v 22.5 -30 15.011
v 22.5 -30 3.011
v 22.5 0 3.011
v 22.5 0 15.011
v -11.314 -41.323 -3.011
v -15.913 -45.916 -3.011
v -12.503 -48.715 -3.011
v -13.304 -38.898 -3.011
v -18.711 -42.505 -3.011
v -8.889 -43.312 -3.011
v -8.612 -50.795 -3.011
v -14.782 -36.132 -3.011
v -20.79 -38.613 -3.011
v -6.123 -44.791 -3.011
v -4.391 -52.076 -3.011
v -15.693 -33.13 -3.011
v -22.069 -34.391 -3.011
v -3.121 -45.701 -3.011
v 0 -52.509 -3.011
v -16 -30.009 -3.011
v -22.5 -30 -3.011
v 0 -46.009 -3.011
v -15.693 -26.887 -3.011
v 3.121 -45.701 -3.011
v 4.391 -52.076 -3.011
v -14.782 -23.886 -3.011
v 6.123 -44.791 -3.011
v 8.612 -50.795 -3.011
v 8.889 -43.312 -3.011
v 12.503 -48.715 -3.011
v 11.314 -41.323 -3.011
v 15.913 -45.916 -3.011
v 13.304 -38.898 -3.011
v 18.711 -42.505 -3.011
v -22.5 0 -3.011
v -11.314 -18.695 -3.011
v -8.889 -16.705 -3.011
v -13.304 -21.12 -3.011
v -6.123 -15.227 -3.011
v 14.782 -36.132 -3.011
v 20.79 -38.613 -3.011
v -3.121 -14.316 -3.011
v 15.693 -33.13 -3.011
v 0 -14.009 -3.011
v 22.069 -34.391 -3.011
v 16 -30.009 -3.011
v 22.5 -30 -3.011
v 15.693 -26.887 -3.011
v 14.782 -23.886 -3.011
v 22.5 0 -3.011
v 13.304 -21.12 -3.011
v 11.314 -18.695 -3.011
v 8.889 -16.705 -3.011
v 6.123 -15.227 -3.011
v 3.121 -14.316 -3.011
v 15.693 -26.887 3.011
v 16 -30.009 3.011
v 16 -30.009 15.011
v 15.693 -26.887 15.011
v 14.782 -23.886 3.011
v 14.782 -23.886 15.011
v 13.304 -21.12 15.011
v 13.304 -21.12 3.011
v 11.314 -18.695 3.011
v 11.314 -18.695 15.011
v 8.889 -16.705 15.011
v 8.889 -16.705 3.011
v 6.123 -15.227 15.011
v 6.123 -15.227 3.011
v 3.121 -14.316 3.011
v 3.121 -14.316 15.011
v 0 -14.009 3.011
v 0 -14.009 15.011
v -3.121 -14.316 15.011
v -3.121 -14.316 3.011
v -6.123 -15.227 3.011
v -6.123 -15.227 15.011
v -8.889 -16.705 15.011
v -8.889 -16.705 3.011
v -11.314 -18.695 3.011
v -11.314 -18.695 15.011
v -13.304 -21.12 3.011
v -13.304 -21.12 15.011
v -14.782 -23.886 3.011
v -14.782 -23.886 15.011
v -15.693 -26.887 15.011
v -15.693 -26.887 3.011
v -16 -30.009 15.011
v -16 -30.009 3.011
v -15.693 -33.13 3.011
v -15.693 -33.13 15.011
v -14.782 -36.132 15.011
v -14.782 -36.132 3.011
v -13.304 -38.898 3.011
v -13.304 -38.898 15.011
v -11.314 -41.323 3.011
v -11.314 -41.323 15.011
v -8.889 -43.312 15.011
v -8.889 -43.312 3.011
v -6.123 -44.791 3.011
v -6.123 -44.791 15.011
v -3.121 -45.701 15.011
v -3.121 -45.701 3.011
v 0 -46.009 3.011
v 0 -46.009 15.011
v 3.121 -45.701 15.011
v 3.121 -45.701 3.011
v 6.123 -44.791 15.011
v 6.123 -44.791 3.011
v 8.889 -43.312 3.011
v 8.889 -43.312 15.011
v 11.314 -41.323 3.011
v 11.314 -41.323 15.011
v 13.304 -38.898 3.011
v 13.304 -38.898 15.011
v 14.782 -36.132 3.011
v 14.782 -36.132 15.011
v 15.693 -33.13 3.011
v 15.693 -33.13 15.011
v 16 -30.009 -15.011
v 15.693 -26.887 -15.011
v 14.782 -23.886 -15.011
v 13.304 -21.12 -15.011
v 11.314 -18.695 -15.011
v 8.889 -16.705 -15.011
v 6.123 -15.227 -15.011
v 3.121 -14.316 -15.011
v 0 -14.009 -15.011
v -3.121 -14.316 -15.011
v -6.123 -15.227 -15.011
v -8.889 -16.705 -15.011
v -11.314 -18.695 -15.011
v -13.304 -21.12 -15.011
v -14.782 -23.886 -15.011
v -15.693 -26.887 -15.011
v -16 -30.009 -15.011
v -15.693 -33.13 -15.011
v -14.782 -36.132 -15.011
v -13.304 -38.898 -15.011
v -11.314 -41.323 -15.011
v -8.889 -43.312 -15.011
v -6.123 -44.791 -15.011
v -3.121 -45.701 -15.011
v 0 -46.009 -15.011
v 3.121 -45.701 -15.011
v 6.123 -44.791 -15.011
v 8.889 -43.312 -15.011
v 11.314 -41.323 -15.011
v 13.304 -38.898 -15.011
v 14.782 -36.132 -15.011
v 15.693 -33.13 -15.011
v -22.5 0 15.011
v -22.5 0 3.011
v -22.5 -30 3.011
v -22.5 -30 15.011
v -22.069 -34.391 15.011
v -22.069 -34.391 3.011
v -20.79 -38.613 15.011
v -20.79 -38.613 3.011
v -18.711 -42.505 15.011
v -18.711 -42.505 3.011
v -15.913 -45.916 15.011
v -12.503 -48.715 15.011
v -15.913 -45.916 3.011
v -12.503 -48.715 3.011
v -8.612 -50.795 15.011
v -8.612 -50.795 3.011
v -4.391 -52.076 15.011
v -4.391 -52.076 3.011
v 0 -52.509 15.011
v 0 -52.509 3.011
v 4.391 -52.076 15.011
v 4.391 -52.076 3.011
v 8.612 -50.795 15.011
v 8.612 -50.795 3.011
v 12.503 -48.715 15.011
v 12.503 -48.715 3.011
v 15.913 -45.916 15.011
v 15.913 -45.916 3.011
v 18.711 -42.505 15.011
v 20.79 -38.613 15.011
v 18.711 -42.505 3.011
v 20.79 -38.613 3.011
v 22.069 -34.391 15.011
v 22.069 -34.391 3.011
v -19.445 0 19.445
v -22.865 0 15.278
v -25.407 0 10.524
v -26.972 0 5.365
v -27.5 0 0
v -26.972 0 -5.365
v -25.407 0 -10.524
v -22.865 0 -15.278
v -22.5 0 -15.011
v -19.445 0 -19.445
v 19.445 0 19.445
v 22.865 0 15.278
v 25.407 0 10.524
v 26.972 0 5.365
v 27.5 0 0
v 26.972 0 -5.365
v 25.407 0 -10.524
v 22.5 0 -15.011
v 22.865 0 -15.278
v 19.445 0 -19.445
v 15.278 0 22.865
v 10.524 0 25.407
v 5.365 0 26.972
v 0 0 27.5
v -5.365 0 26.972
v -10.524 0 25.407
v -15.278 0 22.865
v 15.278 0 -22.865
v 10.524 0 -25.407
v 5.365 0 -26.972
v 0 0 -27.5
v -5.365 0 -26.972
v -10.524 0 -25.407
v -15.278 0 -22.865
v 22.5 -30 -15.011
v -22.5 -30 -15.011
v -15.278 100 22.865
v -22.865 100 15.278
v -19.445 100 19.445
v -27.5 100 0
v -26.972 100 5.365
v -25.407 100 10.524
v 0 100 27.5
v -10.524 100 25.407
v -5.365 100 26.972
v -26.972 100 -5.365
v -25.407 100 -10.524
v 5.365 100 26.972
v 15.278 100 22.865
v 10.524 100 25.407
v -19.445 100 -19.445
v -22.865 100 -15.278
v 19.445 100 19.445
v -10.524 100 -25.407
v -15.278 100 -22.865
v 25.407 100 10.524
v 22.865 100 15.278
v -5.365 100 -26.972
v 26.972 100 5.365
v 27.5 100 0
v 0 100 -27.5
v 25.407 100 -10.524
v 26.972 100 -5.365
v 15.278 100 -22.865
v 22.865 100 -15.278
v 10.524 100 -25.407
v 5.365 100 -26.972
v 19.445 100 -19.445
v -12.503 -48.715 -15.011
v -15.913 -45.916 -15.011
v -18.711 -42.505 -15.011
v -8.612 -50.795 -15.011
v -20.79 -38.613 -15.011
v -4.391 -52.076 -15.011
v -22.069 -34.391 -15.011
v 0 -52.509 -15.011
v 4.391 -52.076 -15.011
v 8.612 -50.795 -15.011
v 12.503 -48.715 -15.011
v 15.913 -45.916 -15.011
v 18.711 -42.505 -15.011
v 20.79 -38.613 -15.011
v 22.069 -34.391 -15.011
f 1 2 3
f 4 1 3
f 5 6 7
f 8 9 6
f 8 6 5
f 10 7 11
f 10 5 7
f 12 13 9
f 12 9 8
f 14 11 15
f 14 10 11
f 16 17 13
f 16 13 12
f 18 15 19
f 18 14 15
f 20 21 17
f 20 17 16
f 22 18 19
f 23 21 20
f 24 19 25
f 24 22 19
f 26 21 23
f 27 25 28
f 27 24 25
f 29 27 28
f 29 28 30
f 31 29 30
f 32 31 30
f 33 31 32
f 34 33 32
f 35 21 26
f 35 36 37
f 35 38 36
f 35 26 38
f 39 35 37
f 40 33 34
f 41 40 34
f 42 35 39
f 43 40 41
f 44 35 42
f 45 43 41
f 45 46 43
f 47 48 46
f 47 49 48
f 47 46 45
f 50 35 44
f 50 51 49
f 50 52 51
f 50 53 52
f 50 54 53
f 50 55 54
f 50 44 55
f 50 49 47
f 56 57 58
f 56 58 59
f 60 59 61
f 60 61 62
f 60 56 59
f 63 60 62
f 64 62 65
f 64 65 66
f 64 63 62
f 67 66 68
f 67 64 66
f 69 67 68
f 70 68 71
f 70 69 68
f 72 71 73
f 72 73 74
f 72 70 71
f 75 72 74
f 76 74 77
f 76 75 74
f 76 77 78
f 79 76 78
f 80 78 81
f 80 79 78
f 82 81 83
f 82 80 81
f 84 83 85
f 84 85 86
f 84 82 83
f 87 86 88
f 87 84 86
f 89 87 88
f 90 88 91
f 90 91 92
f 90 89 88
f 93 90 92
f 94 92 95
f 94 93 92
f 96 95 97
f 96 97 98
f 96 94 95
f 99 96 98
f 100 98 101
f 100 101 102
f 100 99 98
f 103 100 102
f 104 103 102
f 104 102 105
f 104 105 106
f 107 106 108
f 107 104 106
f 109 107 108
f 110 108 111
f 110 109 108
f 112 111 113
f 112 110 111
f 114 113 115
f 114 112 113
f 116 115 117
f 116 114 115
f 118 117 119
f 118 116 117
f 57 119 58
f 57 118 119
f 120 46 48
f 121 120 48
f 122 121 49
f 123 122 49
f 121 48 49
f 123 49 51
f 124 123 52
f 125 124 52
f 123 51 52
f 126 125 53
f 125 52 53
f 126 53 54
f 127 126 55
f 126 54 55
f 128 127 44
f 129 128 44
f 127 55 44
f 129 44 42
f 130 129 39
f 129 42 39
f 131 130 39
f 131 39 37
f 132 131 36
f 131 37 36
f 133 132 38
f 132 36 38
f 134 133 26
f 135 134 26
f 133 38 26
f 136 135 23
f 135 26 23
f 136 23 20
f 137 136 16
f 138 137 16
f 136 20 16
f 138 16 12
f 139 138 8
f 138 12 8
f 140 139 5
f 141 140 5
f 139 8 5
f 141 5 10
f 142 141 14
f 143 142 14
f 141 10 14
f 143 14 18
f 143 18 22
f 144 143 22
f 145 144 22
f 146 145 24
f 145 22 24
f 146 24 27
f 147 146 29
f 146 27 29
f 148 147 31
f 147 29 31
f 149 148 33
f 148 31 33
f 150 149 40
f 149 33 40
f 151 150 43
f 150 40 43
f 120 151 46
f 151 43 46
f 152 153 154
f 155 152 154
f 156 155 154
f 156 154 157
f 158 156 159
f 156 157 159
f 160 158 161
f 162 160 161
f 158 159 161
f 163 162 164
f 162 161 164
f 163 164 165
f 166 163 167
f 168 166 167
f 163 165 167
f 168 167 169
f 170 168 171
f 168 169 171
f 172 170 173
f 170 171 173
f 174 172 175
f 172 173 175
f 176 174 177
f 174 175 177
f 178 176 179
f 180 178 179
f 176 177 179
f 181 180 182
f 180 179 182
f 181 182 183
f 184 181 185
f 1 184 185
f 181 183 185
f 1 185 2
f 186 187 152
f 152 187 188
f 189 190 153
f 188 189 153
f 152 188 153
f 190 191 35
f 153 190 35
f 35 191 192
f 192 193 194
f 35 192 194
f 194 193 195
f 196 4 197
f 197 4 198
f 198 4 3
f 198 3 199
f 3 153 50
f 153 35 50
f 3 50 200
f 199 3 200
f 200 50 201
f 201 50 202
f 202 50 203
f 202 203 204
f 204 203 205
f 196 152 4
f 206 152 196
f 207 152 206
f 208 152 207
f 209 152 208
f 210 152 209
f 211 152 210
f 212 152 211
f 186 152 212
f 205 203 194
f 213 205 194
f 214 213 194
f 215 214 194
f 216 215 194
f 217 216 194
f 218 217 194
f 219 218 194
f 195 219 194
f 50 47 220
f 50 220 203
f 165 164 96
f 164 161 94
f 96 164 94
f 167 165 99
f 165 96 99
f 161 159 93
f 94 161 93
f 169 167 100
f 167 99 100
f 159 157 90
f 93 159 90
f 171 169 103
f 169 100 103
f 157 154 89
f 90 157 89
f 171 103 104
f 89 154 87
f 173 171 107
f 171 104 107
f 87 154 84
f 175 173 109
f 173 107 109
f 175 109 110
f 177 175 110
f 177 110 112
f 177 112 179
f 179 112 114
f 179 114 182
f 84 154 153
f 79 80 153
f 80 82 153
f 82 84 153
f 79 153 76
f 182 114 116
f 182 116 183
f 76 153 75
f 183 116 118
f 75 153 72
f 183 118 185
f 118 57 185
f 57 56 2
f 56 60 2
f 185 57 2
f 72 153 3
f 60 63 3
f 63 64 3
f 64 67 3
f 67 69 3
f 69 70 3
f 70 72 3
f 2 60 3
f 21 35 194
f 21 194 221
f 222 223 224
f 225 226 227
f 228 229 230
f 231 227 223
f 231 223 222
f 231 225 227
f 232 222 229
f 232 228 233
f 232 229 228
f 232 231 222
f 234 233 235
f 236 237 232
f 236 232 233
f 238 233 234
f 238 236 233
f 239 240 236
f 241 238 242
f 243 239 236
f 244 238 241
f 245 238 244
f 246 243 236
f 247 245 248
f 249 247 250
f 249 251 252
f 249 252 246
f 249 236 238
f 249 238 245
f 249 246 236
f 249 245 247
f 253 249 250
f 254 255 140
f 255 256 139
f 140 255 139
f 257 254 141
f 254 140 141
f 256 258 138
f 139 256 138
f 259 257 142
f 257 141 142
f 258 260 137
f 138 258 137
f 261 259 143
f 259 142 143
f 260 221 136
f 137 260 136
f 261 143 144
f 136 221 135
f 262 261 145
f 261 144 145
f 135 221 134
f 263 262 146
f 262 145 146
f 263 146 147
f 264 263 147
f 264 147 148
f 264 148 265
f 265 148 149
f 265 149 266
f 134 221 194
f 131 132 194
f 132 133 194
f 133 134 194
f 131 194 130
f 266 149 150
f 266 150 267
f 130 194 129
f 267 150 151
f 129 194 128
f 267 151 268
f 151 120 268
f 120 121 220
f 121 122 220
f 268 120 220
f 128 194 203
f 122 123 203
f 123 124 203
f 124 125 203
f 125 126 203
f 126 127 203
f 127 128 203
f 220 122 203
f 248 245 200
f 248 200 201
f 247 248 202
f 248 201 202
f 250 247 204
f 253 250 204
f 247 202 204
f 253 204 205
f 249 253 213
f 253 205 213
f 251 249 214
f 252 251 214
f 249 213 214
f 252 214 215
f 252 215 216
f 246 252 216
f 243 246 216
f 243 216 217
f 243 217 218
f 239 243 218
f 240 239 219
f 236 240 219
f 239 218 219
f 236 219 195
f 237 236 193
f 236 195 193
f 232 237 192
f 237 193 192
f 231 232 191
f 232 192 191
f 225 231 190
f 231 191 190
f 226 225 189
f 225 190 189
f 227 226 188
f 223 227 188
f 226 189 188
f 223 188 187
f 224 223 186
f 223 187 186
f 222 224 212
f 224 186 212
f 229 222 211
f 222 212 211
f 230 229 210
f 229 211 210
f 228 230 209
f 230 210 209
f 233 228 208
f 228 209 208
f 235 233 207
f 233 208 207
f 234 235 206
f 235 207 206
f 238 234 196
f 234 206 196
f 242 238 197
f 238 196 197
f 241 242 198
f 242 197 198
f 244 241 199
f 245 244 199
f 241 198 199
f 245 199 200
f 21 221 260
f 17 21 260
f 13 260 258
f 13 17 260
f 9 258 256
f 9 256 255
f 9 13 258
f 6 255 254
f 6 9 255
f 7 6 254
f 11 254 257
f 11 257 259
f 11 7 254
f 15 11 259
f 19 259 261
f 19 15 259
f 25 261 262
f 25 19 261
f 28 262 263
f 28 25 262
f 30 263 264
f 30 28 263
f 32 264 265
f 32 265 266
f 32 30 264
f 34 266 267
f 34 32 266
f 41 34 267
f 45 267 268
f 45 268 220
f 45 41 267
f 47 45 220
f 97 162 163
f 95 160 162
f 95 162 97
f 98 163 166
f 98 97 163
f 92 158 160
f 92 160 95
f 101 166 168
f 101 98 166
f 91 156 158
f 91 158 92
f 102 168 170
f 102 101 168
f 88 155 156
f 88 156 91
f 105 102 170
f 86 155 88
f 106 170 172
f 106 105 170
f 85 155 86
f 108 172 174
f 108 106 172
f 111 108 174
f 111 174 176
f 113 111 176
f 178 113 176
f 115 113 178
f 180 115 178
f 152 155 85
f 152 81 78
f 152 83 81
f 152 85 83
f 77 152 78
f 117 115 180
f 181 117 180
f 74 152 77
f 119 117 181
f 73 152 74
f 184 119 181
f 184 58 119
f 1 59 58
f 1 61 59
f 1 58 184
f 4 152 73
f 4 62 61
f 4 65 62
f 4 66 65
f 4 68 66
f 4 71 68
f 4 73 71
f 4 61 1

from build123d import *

# Parameters (mm, degrees)
SKETCH1_R           = 27.5
BOSS_EXTRUDE1_DEPTH = 100
BOSS_EXTRUDE3_START = -7
SKETCH6_R           = 16
BOSS_EXTRUDE3_DEPTH = 12


with BuildPart() as part:
    # Sketch1 → Boss-Extrude1 (new body)
    with BuildSketch(Plane(origin=(0, 0, 0), x_dir=(1, 0, 0), z_dir=(0, 1, 0))):
        Circle(SKETCH1_R)
    extrude(amount=BOSS_EXTRUDE1_DEPTH)

    # Sketch6 → Boss-Extrude3 (add)
    with BuildSketch(Plane.XY.offset(10.010953).offset(BOSS_EXTRUDE3_START)):
        with BuildLine():
            Line((22.5, 0), (-22.5, 0))
            Line((-22.5, 0), (-22.5, -30))
            ThreePointArc((-22.5, -30), (0, -52.508858033), (22.5, -30))
            Line((22.5, -30), (22.5, 0))
        make_face()
        with Locations((0, -30.00885629)):
            Circle(SKETCH6_R, mode=Mode.SUBTRACT)
    boss_extrude3 = extrude(amount=BOSS_EXTRUDE3_DEPTH)

    # Mirror1: Boss-Extrude3 across plane
    add(boss_extrude3.mirror(Plane.XY))


solid = part.part
